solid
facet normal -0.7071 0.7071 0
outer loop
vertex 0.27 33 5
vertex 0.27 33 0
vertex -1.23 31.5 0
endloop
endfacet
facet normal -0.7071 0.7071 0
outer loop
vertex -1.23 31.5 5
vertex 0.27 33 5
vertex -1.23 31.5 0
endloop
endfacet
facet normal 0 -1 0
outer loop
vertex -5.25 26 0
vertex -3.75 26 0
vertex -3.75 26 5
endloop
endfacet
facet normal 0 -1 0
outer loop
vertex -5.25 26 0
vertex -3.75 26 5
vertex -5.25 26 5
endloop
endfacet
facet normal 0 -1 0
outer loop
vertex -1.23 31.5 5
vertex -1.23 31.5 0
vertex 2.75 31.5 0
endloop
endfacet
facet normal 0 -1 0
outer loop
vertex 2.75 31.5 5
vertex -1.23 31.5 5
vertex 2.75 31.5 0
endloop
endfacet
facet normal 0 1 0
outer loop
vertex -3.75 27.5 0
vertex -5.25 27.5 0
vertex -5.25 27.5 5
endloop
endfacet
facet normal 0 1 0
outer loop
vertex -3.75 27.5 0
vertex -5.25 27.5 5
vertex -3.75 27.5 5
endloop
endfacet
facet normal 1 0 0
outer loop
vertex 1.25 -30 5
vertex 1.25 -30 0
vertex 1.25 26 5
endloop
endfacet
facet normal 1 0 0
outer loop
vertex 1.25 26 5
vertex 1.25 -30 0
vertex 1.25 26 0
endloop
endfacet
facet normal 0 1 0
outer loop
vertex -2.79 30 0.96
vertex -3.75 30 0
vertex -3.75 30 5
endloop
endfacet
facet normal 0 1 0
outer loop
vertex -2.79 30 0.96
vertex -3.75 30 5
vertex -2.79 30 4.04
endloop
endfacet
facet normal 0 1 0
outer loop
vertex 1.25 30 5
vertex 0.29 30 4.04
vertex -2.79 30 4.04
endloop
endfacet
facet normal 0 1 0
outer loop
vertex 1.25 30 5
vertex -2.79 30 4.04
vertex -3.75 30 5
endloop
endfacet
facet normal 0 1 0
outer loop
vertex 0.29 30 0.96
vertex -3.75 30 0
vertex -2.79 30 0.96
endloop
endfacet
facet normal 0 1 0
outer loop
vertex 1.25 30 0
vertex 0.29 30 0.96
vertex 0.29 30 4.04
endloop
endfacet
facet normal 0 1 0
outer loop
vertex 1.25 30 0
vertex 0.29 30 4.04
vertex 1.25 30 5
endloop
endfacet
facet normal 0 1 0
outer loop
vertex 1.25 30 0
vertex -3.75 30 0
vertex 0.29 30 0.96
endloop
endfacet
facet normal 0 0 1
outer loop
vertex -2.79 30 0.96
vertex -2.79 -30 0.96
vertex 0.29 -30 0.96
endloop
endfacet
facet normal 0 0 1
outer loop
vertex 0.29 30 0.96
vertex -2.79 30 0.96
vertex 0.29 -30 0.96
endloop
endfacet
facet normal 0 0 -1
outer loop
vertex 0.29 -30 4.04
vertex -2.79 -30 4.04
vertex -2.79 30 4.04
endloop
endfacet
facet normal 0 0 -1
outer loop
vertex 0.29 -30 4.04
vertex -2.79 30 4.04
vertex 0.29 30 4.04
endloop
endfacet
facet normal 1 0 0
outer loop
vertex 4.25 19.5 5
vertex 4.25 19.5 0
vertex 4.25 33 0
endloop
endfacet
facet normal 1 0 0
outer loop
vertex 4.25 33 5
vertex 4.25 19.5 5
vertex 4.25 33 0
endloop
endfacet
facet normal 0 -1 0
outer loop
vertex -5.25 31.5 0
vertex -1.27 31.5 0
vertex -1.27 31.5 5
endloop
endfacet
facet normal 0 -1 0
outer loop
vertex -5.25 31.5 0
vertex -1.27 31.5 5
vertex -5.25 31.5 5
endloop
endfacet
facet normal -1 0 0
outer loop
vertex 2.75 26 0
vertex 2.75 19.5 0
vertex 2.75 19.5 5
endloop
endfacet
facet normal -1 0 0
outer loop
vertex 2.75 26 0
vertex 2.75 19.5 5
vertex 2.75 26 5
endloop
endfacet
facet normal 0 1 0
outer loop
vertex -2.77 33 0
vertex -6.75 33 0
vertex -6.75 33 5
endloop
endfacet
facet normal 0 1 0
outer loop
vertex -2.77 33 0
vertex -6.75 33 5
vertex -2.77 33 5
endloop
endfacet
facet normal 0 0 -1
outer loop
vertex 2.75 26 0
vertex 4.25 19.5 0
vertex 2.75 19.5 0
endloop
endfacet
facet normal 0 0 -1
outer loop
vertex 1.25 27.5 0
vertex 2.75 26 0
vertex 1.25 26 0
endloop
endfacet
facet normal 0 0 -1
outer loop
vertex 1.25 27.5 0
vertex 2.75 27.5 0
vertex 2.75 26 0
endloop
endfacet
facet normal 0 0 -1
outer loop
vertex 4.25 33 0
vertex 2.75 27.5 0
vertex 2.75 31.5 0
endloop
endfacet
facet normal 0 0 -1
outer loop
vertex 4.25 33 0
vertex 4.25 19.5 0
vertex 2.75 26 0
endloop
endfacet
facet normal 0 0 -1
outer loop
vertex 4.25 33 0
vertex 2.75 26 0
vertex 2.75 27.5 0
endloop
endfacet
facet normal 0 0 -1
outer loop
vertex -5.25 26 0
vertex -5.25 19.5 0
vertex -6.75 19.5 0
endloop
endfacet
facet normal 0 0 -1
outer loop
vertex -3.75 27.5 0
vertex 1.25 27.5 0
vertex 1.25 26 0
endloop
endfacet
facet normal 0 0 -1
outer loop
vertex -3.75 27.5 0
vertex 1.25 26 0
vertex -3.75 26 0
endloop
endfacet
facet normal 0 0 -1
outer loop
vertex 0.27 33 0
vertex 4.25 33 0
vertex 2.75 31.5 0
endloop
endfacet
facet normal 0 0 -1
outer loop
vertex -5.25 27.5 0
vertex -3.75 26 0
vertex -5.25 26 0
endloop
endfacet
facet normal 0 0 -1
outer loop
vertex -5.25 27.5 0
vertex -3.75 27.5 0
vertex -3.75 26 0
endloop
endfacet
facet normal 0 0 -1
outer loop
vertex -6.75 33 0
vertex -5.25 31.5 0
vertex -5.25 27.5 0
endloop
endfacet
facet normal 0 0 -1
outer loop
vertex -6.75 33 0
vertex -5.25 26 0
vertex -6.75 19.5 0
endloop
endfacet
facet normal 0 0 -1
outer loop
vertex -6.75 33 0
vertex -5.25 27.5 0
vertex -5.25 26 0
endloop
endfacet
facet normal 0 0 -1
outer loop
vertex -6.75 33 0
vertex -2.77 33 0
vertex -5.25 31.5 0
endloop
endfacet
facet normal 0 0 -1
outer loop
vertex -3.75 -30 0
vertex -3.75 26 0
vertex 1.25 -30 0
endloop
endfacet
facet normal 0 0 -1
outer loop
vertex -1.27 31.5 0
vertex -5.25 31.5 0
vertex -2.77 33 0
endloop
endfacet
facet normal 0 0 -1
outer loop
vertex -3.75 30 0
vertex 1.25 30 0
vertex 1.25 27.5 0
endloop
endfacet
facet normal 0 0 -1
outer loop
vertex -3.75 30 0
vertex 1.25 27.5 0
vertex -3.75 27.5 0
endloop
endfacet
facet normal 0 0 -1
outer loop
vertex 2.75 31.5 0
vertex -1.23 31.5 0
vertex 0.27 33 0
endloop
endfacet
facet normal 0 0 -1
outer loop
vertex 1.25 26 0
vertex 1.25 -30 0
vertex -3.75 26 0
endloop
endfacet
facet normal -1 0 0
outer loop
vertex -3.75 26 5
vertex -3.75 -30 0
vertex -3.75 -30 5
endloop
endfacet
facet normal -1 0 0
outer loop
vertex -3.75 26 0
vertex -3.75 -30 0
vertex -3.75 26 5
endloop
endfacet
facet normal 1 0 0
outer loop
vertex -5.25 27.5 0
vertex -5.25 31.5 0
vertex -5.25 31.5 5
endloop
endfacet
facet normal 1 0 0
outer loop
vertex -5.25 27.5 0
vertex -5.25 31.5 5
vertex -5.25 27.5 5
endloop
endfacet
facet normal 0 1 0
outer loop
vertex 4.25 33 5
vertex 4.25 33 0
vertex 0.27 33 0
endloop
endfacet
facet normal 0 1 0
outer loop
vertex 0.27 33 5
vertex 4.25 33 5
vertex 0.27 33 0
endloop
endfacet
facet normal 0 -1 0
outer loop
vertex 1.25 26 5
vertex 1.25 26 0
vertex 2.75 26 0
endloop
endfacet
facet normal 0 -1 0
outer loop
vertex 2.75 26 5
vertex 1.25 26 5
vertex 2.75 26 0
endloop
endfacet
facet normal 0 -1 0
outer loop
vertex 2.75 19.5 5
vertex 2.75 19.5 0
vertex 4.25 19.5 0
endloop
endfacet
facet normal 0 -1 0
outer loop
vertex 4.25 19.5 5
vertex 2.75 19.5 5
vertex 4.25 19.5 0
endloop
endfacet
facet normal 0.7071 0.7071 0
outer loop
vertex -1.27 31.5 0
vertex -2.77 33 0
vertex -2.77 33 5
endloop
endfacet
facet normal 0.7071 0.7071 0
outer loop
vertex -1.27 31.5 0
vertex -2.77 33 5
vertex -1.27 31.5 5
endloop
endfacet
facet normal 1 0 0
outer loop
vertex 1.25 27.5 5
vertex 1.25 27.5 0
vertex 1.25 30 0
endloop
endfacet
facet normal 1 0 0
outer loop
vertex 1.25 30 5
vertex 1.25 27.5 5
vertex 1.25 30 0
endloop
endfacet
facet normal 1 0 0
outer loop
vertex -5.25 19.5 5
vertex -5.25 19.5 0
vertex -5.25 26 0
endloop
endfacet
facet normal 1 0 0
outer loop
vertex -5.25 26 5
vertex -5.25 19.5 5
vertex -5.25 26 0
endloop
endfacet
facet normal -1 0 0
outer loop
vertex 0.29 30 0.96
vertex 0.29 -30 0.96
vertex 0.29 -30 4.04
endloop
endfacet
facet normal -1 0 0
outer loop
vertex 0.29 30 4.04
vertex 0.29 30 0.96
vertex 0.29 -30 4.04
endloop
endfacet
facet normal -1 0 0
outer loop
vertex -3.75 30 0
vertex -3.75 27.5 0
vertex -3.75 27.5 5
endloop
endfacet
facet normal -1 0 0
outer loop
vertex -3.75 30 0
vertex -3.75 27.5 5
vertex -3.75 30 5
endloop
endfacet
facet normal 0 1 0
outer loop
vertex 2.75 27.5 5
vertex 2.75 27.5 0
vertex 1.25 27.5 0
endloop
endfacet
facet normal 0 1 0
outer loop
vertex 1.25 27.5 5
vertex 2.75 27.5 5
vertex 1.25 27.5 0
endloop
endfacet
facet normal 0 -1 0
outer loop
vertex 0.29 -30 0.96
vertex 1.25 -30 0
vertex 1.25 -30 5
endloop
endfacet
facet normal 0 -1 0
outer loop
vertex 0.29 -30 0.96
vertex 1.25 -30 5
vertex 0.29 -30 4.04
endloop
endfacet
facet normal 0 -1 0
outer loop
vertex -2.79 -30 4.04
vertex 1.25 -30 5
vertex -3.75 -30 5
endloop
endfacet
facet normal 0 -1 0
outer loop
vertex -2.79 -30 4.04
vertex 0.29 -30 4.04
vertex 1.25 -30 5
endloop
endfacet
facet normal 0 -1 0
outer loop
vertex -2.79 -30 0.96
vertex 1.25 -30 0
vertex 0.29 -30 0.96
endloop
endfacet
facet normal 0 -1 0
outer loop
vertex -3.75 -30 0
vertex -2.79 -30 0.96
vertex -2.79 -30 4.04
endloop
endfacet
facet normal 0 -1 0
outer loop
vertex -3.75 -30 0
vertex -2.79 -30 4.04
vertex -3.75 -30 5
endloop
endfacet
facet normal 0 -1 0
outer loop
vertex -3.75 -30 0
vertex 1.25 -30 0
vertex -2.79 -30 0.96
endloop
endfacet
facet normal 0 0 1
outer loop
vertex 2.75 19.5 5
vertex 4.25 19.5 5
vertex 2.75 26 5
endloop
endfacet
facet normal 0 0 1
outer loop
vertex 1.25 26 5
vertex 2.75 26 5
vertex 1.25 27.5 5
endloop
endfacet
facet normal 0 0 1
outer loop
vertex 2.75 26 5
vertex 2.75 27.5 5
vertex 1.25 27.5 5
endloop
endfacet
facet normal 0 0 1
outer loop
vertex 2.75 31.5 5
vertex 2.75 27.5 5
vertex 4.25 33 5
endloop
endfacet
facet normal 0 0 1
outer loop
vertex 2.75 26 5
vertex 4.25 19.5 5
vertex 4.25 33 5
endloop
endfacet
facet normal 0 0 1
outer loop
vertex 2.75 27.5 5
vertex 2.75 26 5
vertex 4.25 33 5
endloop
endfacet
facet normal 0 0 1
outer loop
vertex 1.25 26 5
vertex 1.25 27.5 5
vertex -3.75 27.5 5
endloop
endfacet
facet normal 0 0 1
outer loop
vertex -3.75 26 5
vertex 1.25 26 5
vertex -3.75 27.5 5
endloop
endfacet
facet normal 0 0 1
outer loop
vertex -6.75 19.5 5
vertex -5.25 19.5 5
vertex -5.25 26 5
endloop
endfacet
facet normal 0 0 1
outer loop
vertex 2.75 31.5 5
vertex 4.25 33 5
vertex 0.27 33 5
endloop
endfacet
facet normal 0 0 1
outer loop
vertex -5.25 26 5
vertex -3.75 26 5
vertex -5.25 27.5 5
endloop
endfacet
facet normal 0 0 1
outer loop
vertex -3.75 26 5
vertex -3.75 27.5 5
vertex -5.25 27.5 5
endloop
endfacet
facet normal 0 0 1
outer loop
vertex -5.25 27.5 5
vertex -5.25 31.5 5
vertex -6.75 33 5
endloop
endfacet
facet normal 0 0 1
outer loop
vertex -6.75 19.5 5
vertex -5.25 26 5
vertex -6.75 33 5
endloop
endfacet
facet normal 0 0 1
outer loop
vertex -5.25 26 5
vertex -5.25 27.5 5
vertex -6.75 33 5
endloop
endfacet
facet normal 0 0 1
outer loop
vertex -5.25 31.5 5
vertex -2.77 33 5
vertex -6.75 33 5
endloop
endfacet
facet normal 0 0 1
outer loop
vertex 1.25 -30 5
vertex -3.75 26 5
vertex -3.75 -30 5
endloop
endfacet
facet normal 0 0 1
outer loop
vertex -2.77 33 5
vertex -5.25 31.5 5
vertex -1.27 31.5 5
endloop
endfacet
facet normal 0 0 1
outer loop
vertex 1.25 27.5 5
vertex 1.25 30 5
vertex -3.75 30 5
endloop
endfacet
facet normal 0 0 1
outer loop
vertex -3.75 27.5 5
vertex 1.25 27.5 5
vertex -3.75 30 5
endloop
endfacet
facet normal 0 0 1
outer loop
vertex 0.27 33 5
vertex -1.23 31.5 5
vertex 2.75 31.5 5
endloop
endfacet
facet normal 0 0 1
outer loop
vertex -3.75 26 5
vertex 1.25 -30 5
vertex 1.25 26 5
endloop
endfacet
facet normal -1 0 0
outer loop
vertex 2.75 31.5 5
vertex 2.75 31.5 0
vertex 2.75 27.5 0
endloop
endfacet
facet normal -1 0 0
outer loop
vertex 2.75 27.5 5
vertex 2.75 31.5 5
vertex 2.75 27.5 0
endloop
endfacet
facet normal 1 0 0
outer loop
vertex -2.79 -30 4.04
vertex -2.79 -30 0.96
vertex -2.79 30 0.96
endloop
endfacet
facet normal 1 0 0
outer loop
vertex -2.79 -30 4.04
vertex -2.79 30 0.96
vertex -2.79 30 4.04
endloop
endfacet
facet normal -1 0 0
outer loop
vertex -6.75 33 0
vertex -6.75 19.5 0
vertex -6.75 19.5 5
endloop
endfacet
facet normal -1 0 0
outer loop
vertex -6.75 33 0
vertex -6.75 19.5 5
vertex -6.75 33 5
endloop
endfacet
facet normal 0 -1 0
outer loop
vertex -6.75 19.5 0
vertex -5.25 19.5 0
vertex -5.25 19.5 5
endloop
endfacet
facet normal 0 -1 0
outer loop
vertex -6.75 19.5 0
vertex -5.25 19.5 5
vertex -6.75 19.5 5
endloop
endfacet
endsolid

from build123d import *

# Parameters (mm, degrees)
F0_W     = 1.5
F0_H     = 6.5
F1_DEPTH = 5
F3_W     = 3.08
F3_H     = 3.08
F4_DEPTH = 60


with BuildPart() as f1:
    # F0 (on Top) → F1 (new body)
    with BuildSketch(Plane.XY):
        Polygon((-1.25, -30), (1.25, -30), (1.25, 26), (1.25, 27.5), (1.25, 30), (-1.25, 30), align=None)
        Polygon((1.25, 27.5), (1.25, 26), (2.75, 26), (4.25, 26), (4.25, 33), (0.27, 33), (-1.23, 31.5), (2.75, 31.5), (2.75, 27.5), align=None)
        with Locations((3.5, 22.75)):
            Rectangle(F0_W, F0_H)
    extrude(amount=F1_DEPTH)

    # F2: F1 across face


with BuildPart() as f1_1:
    add(f1.part)
    add(f1.part.mirror(Plane(origin=(-1.25, 0, 2.5), x_dir=(0, -1, 0), z_dir=(-1, 0, 0))))

    # F3 (on face) → F4 (cut, through all)
    with BuildSketch(Plane.XZ.offset(30)):
        with Locations((-1.25, 2.5)):
            Rectangle(F3_W, F3_H)
    extrude(amount=-F4_DEPTH, mode=Mode.SUBTRACT)


solid = f1_1.part
